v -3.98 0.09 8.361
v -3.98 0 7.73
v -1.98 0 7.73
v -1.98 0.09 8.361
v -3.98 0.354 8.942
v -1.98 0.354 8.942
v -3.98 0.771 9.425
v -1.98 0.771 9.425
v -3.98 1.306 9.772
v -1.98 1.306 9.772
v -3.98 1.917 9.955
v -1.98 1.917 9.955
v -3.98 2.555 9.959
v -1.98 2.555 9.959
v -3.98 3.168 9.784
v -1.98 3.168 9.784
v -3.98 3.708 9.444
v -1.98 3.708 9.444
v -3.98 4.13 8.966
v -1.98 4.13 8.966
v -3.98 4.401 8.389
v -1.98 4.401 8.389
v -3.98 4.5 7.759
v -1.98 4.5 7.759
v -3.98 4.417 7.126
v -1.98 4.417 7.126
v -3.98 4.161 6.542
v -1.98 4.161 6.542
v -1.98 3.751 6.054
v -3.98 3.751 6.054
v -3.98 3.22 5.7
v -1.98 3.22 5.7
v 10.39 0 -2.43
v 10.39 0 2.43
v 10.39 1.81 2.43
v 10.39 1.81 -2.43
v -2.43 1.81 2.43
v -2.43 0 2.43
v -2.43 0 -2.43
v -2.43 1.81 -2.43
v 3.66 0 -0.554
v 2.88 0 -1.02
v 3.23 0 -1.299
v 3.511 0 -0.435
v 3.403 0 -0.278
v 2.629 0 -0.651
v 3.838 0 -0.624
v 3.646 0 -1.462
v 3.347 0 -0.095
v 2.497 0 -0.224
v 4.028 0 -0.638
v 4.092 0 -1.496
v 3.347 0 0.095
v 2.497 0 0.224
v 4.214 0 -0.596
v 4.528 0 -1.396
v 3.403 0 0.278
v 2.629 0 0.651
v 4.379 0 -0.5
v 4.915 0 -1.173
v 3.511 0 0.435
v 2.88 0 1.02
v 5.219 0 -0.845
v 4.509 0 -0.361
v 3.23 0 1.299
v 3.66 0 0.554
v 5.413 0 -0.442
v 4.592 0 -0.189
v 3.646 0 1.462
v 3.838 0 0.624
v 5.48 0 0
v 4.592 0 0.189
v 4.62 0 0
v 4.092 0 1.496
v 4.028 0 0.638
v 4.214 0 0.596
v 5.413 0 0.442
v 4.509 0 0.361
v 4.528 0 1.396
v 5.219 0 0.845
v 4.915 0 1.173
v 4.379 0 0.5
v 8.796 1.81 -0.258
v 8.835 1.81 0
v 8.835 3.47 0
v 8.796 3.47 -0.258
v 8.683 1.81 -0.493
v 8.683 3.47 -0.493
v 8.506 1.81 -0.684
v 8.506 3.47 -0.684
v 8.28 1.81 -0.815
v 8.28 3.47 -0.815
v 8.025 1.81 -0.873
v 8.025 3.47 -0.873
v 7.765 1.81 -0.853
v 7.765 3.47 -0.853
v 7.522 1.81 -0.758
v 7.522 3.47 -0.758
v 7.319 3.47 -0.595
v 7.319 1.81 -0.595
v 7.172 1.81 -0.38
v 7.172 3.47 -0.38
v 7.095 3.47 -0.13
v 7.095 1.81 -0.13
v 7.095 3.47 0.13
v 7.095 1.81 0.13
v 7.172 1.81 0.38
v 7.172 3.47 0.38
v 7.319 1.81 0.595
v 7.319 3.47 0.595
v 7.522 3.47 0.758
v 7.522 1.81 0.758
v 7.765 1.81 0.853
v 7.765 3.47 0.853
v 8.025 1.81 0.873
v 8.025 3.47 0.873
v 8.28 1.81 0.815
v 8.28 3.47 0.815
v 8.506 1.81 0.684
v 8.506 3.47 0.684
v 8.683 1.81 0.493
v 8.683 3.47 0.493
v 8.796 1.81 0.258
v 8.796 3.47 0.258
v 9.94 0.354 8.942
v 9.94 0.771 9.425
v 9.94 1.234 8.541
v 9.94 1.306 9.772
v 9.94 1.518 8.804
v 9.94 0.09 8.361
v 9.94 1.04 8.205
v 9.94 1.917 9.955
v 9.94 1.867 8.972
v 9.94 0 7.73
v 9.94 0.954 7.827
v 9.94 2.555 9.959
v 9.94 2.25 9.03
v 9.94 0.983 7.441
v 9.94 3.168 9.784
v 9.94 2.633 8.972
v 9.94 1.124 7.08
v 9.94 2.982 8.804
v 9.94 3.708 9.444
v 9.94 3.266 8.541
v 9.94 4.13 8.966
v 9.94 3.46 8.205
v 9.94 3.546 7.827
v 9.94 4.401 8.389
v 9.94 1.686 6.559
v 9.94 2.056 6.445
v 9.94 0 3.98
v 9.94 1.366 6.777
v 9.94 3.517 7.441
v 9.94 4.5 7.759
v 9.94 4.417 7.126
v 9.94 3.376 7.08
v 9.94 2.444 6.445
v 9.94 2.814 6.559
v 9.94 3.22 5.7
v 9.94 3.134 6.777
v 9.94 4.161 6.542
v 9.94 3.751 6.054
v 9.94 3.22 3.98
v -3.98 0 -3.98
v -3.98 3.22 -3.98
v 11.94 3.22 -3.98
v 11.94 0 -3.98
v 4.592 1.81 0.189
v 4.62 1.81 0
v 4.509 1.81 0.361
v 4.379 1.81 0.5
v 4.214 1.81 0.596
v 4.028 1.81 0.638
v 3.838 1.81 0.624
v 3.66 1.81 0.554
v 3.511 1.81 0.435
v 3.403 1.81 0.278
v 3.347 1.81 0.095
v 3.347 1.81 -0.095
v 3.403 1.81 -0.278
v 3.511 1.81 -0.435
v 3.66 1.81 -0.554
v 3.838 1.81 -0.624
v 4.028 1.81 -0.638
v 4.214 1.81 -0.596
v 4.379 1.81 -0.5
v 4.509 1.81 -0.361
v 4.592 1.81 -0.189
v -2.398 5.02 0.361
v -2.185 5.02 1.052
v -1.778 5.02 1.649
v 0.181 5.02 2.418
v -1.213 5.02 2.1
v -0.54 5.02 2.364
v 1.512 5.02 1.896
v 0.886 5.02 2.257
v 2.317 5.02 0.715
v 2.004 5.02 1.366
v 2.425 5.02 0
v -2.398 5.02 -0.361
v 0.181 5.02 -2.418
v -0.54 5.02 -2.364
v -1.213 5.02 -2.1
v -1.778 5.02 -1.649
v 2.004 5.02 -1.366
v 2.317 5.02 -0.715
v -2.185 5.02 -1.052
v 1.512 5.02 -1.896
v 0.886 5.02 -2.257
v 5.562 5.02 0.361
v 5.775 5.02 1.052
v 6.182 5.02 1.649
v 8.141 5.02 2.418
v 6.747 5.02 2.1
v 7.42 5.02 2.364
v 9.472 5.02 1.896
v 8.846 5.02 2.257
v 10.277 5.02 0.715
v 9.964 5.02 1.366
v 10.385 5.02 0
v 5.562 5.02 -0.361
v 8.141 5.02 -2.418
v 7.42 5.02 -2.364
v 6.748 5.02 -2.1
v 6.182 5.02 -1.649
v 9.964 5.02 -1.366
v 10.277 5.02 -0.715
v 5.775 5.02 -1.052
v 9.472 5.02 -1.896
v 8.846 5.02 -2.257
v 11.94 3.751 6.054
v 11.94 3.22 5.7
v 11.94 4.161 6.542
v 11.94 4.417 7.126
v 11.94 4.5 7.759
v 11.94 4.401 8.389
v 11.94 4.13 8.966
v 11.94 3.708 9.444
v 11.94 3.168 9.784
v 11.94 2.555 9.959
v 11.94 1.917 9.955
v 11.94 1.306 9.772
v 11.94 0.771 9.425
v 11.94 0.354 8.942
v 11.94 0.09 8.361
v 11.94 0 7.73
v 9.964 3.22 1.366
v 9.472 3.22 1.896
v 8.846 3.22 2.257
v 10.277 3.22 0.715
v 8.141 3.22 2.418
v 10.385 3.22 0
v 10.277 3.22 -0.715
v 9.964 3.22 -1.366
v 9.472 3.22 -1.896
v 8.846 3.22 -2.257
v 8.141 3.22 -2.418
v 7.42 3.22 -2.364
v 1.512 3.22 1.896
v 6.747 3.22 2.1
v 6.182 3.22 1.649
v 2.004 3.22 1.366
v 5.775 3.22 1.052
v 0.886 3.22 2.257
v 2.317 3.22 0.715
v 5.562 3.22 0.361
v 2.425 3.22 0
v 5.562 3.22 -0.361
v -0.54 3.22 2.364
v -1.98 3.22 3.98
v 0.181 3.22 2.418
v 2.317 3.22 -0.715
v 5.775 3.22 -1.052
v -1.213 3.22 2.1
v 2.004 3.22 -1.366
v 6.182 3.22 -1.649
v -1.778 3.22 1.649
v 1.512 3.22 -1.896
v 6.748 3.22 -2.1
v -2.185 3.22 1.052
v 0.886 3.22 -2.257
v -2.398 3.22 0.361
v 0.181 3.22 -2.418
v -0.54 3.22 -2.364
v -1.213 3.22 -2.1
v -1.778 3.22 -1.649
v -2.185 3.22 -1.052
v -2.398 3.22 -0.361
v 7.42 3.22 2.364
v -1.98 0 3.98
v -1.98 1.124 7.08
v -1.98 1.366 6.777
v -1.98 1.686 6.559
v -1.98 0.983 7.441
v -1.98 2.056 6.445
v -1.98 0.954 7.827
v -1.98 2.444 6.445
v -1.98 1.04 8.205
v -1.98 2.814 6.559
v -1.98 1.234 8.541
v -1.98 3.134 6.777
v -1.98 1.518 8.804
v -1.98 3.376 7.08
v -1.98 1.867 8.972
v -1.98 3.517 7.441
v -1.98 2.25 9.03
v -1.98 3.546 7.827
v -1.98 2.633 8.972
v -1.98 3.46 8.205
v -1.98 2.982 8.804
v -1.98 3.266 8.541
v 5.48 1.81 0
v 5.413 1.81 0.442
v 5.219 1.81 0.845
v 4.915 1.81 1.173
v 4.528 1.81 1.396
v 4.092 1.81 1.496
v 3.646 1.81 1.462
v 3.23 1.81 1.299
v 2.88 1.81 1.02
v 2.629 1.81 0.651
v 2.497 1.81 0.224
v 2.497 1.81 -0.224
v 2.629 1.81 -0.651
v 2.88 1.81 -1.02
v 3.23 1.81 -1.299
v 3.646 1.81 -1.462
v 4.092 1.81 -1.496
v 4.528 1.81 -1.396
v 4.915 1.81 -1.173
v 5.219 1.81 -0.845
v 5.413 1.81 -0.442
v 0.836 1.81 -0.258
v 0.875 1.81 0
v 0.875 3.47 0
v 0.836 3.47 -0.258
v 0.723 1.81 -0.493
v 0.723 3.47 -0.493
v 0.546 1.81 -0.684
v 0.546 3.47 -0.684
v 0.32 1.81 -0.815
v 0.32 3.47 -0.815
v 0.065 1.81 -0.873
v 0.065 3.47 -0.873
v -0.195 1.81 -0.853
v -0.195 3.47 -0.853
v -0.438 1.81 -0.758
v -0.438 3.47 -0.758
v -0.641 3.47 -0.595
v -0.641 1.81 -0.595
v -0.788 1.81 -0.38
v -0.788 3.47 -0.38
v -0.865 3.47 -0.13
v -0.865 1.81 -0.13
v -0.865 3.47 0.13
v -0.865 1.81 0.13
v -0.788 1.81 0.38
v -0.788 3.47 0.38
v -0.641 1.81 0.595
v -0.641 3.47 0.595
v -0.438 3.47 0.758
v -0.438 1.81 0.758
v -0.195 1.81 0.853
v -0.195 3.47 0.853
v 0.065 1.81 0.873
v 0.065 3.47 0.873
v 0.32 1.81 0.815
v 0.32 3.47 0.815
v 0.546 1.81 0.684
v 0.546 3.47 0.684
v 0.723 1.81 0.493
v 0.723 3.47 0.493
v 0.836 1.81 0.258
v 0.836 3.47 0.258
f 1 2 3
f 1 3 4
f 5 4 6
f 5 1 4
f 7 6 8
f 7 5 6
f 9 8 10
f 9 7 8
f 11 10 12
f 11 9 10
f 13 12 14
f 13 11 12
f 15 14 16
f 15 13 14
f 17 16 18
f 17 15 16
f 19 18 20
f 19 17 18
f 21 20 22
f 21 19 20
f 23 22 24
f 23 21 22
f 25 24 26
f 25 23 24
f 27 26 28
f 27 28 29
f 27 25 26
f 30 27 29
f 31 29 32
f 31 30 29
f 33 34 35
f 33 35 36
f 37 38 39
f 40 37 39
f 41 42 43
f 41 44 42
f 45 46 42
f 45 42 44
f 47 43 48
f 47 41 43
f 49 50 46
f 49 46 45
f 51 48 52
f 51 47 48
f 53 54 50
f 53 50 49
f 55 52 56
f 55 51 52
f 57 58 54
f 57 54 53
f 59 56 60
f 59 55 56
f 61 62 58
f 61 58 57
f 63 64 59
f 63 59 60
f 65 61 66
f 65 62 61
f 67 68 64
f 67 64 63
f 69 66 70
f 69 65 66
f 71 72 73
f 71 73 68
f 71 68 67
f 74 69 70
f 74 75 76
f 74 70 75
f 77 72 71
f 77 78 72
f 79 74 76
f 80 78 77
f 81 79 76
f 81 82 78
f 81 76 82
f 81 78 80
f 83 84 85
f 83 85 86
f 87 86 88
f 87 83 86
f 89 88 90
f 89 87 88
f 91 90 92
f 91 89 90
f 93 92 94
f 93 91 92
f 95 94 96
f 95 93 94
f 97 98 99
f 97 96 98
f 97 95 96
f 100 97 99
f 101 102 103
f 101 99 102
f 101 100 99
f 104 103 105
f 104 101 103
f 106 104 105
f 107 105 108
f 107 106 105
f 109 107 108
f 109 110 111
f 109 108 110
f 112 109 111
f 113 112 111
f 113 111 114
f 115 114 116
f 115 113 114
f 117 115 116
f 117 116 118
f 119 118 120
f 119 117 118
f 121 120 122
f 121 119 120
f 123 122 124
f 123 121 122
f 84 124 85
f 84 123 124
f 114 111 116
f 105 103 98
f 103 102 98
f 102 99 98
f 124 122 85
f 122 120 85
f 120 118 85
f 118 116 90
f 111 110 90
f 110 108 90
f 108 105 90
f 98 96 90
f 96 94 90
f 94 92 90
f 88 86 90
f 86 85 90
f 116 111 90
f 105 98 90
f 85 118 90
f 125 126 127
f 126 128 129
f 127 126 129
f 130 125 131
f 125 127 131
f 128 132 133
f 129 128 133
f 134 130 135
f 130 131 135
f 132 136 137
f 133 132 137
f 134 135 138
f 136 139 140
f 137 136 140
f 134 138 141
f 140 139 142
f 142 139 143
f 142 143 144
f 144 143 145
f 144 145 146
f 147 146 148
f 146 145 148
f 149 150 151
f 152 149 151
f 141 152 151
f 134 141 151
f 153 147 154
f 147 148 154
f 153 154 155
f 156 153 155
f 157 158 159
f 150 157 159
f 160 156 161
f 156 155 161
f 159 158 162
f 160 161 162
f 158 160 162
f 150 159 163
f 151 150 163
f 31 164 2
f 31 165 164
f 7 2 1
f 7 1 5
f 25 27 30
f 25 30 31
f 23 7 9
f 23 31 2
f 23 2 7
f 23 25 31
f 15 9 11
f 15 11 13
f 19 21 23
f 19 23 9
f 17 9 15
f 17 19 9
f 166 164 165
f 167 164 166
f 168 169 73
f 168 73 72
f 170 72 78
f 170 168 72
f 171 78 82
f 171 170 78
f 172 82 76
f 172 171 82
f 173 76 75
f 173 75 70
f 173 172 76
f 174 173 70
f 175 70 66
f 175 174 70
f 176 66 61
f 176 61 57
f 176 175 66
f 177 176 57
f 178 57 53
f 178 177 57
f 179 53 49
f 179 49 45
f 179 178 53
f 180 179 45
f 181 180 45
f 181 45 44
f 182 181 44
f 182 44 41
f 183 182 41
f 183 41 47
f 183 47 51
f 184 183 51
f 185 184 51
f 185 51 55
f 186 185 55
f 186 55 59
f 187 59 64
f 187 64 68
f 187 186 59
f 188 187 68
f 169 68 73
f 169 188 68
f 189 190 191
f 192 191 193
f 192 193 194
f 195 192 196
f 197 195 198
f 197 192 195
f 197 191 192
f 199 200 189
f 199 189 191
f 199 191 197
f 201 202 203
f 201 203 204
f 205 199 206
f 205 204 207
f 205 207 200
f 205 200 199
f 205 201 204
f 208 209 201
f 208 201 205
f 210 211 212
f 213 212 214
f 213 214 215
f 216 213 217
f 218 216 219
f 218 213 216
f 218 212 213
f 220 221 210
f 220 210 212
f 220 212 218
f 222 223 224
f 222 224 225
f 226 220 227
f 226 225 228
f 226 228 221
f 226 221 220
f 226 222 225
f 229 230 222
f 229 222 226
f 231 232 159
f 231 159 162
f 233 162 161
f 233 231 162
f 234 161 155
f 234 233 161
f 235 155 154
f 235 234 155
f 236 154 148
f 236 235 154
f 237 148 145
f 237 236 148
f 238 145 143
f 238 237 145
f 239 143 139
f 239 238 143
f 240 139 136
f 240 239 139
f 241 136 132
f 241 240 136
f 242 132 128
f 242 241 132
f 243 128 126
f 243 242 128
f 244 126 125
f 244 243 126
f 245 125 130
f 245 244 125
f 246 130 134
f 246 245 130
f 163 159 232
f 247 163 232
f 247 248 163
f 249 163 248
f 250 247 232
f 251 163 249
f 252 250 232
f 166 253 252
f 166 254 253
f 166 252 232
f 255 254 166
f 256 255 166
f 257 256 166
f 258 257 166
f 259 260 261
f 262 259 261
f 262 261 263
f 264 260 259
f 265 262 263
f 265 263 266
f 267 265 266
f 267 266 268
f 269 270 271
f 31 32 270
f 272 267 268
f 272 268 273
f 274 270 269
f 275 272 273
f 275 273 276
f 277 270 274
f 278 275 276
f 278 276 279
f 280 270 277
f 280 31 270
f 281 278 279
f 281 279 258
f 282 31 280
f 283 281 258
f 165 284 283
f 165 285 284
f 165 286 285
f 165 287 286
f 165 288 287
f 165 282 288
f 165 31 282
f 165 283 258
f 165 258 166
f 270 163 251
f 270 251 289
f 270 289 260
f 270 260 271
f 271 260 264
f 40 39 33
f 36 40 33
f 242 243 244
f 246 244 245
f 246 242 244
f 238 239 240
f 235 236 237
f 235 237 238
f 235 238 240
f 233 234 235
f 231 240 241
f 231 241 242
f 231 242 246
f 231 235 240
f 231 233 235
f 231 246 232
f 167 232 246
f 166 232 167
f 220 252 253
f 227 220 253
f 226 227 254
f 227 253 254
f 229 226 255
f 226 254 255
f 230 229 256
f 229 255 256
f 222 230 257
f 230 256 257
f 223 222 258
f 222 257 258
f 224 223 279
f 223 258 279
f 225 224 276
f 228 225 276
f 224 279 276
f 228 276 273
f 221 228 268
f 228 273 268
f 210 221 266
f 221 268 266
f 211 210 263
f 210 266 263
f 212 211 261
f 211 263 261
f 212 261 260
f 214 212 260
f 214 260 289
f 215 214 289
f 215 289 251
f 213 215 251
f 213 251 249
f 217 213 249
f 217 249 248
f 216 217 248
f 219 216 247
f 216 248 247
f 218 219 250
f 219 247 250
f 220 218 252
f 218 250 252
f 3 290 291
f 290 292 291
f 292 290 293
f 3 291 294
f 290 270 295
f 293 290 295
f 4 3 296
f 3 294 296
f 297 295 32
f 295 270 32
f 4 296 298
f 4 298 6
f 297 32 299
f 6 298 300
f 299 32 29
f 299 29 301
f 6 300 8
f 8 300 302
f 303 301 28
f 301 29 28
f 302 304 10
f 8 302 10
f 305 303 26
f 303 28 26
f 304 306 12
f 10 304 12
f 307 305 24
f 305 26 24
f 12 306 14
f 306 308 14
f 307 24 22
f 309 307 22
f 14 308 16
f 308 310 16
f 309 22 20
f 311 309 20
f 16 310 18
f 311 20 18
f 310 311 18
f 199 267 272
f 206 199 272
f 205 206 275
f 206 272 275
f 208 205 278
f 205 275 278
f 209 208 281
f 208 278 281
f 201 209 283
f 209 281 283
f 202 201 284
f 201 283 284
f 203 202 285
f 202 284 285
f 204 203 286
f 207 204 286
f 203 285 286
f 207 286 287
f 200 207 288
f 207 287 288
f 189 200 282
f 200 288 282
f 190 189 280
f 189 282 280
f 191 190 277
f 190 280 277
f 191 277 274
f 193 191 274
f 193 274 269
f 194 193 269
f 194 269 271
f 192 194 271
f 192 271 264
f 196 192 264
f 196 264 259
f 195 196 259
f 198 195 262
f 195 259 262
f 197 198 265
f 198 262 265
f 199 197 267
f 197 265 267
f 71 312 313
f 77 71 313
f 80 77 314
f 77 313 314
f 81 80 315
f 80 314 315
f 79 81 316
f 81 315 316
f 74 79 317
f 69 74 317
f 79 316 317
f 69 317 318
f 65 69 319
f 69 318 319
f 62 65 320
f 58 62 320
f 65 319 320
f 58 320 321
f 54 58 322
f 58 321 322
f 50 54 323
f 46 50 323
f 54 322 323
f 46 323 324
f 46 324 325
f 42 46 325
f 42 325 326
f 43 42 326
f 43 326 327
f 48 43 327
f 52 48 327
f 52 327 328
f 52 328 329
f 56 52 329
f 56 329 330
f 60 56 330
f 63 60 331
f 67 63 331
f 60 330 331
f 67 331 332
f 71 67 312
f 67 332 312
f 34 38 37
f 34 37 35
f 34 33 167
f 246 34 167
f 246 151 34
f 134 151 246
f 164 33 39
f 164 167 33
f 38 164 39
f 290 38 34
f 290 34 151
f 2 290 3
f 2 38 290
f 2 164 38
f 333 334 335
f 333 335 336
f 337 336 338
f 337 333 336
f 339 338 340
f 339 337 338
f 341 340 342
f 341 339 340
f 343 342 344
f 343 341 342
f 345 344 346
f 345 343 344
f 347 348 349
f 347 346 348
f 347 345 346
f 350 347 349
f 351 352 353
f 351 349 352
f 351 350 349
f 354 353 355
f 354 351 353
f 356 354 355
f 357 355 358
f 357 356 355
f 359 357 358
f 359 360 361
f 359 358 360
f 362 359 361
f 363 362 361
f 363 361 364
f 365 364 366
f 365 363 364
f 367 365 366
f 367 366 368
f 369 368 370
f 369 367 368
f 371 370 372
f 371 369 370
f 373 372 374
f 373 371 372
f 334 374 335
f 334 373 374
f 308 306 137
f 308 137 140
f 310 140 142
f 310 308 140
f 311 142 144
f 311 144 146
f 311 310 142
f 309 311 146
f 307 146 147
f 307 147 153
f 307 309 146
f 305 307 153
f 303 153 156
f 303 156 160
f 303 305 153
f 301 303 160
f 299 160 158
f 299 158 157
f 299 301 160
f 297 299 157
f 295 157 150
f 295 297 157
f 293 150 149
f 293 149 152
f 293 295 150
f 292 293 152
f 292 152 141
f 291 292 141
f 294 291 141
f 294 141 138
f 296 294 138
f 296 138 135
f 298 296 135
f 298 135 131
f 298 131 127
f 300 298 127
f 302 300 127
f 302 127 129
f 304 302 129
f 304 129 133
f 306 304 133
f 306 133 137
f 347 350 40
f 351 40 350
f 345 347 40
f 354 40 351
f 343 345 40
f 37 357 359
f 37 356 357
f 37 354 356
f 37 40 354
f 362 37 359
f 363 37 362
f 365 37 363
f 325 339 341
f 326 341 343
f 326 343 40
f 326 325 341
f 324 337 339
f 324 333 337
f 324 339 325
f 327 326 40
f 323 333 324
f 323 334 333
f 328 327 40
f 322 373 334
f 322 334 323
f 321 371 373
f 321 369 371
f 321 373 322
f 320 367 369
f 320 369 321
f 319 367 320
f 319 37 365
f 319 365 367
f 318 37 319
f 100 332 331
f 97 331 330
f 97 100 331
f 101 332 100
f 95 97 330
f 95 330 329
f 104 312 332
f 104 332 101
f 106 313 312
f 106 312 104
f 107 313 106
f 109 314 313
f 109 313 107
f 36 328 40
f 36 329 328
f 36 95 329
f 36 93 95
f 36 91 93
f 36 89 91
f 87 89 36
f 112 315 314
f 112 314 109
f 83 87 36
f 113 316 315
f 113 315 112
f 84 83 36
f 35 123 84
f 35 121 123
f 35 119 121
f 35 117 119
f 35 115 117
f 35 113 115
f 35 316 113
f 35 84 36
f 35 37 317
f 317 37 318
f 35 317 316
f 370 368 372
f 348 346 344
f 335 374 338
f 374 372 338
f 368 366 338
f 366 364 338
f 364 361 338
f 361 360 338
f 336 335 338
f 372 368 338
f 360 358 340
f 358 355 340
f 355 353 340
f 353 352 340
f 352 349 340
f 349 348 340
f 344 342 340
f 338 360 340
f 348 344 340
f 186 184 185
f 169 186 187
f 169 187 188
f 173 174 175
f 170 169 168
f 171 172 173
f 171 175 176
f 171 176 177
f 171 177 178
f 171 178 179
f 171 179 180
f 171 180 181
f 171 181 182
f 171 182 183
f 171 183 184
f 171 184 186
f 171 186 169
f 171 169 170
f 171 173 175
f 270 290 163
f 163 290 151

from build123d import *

# Parameters (mm, degrees)
SKETCH1_W       = 7.96
SKETCH1_H       = 7.96
EXTRUDE1_DEPTH  = 3.22
SKETCH2_R       = 2.425
EXTRUDE2_DEPTH  = 1.8
LPATTERN1_COUNT = 2
LPATTERN1_PITCH = 7.96
SHELL1_T        = -1.55
SKETCH4_W       = 12.82
SKETCH4_H       = 4.86
EXTRUDE3_DEPTH  = 0.14
SKETCH5_R       = 1.5
SKETCH5_R_2     = 0.64
EXTRUDE4_DEPTH  = 1.81
EXTRUDE5_DEPTH  = 2
EXTRUDE6_DEPTH  = 2
SKETCH8_R       = 1.3
EXTRUDE7_DEPTH  = 15.92


with BuildPart() as part:
    # Sketch1 → Extrude1 (new body)
    with BuildSketch(Plane(origin=(0, 0, 0), x_dir=(1, 0, 0), z_dir=(0, 1, 0))):
        Rectangle(SKETCH1_W, SKETCH1_H)
    extrude1 = extrude(amount=EXTRUDE1_DEPTH)

    # Sketch2 → Extrude2 (add)
    with BuildSketch(Plane(origin=(0, 3.22, 0), x_dir=(1, 0, 0), z_dir=(0, 1, 0))):
        Circle(SKETCH2_R)
    extrude2 = extrude(amount=EXTRUDE2_DEPTH)

    # LPattern1: Extrude1, Extrude2 ×2
    with Locations(*[(i * LPATTERN1_PITCH, 0, 0) for i in range(1, LPATTERN1_COUNT)]):
        add(extrude1)
        add(extrude2)

    # Shell1
    shell1_openings = [part.faces().sort_by_distance(p)[0] for p in [
        (3.98, 0, 0),
    ]]
    offset(amount=SHELL1_T, openings=shell1_openings, kind=Kind.INTERSECTION)

    # Sketch4 → Extrude3 (cut)
    with BuildSketch(Plane.XZ.offset(-1.67)):
        with Locations((3.98, 0)):
            Rectangle(SKETCH4_W, SKETCH4_H)
    extrude(amount=-EXTRUDE3_DEPTH, mode=Mode.SUBTRACT)

    # Sketch5 → Extrude4 (add)
    with BuildSketch(Plane.XZ.offset(-1.81)):
        with Locations((3.98, 0)):
            Circle(SKETCH5_R)
        with Locations((3.98, 0)):
            Circle(SKETCH5_R_2, mode=Mode.SUBTRACT)
    extrude(amount=EXTRUDE4_DEPTH)

    # Sketch6 → Extrude5 (add)
    with BuildSketch(Plane(origin=(11.94, 0, 0), x_dir=(0, 0, -1), z_dir=(1, 0, 0))):
        with BuildLine():
            Line((-7.73, 0), (-3.98, 0))
            Line((-3.98, 0), (-3.98, 3.22))
            Line((-3.98, 3.22), (-5.699827594, 3.22))
            ThreePointArc((-5.699827594, 3.22), (-9.633286631, 3.45), (-7.73, 0))
        make_face()
    extrude(amount=-EXTRUDE5_DEPTH)

    # Sketch7 → Extrude6 (add)
    with BuildSketch(Plane.ZY.offset(3.98)):
        with BuildLine():
            Line((3.98, 3.22), (3.98, 0))
            Line((3.98, 0), (7.73, 0))
            ThreePointArc((7.73, 0), (9.633286631, 3.45), (5.699827594, 3.22))
            Line((5.699827594, 3.22), (3.98, 3.22))
        make_face()
    extrude(amount=-EXTRUDE6_DEPTH)

    # Sketch8 → Extrude7 (add)
    with BuildSketch(Plane.ZY.offset(3.98)):
        with Locations((7.73, 2.25)):
            Circle(SKETCH8_R)
    extrude(amount=-EXTRUDE7_DEPTH)


solid = part.part
